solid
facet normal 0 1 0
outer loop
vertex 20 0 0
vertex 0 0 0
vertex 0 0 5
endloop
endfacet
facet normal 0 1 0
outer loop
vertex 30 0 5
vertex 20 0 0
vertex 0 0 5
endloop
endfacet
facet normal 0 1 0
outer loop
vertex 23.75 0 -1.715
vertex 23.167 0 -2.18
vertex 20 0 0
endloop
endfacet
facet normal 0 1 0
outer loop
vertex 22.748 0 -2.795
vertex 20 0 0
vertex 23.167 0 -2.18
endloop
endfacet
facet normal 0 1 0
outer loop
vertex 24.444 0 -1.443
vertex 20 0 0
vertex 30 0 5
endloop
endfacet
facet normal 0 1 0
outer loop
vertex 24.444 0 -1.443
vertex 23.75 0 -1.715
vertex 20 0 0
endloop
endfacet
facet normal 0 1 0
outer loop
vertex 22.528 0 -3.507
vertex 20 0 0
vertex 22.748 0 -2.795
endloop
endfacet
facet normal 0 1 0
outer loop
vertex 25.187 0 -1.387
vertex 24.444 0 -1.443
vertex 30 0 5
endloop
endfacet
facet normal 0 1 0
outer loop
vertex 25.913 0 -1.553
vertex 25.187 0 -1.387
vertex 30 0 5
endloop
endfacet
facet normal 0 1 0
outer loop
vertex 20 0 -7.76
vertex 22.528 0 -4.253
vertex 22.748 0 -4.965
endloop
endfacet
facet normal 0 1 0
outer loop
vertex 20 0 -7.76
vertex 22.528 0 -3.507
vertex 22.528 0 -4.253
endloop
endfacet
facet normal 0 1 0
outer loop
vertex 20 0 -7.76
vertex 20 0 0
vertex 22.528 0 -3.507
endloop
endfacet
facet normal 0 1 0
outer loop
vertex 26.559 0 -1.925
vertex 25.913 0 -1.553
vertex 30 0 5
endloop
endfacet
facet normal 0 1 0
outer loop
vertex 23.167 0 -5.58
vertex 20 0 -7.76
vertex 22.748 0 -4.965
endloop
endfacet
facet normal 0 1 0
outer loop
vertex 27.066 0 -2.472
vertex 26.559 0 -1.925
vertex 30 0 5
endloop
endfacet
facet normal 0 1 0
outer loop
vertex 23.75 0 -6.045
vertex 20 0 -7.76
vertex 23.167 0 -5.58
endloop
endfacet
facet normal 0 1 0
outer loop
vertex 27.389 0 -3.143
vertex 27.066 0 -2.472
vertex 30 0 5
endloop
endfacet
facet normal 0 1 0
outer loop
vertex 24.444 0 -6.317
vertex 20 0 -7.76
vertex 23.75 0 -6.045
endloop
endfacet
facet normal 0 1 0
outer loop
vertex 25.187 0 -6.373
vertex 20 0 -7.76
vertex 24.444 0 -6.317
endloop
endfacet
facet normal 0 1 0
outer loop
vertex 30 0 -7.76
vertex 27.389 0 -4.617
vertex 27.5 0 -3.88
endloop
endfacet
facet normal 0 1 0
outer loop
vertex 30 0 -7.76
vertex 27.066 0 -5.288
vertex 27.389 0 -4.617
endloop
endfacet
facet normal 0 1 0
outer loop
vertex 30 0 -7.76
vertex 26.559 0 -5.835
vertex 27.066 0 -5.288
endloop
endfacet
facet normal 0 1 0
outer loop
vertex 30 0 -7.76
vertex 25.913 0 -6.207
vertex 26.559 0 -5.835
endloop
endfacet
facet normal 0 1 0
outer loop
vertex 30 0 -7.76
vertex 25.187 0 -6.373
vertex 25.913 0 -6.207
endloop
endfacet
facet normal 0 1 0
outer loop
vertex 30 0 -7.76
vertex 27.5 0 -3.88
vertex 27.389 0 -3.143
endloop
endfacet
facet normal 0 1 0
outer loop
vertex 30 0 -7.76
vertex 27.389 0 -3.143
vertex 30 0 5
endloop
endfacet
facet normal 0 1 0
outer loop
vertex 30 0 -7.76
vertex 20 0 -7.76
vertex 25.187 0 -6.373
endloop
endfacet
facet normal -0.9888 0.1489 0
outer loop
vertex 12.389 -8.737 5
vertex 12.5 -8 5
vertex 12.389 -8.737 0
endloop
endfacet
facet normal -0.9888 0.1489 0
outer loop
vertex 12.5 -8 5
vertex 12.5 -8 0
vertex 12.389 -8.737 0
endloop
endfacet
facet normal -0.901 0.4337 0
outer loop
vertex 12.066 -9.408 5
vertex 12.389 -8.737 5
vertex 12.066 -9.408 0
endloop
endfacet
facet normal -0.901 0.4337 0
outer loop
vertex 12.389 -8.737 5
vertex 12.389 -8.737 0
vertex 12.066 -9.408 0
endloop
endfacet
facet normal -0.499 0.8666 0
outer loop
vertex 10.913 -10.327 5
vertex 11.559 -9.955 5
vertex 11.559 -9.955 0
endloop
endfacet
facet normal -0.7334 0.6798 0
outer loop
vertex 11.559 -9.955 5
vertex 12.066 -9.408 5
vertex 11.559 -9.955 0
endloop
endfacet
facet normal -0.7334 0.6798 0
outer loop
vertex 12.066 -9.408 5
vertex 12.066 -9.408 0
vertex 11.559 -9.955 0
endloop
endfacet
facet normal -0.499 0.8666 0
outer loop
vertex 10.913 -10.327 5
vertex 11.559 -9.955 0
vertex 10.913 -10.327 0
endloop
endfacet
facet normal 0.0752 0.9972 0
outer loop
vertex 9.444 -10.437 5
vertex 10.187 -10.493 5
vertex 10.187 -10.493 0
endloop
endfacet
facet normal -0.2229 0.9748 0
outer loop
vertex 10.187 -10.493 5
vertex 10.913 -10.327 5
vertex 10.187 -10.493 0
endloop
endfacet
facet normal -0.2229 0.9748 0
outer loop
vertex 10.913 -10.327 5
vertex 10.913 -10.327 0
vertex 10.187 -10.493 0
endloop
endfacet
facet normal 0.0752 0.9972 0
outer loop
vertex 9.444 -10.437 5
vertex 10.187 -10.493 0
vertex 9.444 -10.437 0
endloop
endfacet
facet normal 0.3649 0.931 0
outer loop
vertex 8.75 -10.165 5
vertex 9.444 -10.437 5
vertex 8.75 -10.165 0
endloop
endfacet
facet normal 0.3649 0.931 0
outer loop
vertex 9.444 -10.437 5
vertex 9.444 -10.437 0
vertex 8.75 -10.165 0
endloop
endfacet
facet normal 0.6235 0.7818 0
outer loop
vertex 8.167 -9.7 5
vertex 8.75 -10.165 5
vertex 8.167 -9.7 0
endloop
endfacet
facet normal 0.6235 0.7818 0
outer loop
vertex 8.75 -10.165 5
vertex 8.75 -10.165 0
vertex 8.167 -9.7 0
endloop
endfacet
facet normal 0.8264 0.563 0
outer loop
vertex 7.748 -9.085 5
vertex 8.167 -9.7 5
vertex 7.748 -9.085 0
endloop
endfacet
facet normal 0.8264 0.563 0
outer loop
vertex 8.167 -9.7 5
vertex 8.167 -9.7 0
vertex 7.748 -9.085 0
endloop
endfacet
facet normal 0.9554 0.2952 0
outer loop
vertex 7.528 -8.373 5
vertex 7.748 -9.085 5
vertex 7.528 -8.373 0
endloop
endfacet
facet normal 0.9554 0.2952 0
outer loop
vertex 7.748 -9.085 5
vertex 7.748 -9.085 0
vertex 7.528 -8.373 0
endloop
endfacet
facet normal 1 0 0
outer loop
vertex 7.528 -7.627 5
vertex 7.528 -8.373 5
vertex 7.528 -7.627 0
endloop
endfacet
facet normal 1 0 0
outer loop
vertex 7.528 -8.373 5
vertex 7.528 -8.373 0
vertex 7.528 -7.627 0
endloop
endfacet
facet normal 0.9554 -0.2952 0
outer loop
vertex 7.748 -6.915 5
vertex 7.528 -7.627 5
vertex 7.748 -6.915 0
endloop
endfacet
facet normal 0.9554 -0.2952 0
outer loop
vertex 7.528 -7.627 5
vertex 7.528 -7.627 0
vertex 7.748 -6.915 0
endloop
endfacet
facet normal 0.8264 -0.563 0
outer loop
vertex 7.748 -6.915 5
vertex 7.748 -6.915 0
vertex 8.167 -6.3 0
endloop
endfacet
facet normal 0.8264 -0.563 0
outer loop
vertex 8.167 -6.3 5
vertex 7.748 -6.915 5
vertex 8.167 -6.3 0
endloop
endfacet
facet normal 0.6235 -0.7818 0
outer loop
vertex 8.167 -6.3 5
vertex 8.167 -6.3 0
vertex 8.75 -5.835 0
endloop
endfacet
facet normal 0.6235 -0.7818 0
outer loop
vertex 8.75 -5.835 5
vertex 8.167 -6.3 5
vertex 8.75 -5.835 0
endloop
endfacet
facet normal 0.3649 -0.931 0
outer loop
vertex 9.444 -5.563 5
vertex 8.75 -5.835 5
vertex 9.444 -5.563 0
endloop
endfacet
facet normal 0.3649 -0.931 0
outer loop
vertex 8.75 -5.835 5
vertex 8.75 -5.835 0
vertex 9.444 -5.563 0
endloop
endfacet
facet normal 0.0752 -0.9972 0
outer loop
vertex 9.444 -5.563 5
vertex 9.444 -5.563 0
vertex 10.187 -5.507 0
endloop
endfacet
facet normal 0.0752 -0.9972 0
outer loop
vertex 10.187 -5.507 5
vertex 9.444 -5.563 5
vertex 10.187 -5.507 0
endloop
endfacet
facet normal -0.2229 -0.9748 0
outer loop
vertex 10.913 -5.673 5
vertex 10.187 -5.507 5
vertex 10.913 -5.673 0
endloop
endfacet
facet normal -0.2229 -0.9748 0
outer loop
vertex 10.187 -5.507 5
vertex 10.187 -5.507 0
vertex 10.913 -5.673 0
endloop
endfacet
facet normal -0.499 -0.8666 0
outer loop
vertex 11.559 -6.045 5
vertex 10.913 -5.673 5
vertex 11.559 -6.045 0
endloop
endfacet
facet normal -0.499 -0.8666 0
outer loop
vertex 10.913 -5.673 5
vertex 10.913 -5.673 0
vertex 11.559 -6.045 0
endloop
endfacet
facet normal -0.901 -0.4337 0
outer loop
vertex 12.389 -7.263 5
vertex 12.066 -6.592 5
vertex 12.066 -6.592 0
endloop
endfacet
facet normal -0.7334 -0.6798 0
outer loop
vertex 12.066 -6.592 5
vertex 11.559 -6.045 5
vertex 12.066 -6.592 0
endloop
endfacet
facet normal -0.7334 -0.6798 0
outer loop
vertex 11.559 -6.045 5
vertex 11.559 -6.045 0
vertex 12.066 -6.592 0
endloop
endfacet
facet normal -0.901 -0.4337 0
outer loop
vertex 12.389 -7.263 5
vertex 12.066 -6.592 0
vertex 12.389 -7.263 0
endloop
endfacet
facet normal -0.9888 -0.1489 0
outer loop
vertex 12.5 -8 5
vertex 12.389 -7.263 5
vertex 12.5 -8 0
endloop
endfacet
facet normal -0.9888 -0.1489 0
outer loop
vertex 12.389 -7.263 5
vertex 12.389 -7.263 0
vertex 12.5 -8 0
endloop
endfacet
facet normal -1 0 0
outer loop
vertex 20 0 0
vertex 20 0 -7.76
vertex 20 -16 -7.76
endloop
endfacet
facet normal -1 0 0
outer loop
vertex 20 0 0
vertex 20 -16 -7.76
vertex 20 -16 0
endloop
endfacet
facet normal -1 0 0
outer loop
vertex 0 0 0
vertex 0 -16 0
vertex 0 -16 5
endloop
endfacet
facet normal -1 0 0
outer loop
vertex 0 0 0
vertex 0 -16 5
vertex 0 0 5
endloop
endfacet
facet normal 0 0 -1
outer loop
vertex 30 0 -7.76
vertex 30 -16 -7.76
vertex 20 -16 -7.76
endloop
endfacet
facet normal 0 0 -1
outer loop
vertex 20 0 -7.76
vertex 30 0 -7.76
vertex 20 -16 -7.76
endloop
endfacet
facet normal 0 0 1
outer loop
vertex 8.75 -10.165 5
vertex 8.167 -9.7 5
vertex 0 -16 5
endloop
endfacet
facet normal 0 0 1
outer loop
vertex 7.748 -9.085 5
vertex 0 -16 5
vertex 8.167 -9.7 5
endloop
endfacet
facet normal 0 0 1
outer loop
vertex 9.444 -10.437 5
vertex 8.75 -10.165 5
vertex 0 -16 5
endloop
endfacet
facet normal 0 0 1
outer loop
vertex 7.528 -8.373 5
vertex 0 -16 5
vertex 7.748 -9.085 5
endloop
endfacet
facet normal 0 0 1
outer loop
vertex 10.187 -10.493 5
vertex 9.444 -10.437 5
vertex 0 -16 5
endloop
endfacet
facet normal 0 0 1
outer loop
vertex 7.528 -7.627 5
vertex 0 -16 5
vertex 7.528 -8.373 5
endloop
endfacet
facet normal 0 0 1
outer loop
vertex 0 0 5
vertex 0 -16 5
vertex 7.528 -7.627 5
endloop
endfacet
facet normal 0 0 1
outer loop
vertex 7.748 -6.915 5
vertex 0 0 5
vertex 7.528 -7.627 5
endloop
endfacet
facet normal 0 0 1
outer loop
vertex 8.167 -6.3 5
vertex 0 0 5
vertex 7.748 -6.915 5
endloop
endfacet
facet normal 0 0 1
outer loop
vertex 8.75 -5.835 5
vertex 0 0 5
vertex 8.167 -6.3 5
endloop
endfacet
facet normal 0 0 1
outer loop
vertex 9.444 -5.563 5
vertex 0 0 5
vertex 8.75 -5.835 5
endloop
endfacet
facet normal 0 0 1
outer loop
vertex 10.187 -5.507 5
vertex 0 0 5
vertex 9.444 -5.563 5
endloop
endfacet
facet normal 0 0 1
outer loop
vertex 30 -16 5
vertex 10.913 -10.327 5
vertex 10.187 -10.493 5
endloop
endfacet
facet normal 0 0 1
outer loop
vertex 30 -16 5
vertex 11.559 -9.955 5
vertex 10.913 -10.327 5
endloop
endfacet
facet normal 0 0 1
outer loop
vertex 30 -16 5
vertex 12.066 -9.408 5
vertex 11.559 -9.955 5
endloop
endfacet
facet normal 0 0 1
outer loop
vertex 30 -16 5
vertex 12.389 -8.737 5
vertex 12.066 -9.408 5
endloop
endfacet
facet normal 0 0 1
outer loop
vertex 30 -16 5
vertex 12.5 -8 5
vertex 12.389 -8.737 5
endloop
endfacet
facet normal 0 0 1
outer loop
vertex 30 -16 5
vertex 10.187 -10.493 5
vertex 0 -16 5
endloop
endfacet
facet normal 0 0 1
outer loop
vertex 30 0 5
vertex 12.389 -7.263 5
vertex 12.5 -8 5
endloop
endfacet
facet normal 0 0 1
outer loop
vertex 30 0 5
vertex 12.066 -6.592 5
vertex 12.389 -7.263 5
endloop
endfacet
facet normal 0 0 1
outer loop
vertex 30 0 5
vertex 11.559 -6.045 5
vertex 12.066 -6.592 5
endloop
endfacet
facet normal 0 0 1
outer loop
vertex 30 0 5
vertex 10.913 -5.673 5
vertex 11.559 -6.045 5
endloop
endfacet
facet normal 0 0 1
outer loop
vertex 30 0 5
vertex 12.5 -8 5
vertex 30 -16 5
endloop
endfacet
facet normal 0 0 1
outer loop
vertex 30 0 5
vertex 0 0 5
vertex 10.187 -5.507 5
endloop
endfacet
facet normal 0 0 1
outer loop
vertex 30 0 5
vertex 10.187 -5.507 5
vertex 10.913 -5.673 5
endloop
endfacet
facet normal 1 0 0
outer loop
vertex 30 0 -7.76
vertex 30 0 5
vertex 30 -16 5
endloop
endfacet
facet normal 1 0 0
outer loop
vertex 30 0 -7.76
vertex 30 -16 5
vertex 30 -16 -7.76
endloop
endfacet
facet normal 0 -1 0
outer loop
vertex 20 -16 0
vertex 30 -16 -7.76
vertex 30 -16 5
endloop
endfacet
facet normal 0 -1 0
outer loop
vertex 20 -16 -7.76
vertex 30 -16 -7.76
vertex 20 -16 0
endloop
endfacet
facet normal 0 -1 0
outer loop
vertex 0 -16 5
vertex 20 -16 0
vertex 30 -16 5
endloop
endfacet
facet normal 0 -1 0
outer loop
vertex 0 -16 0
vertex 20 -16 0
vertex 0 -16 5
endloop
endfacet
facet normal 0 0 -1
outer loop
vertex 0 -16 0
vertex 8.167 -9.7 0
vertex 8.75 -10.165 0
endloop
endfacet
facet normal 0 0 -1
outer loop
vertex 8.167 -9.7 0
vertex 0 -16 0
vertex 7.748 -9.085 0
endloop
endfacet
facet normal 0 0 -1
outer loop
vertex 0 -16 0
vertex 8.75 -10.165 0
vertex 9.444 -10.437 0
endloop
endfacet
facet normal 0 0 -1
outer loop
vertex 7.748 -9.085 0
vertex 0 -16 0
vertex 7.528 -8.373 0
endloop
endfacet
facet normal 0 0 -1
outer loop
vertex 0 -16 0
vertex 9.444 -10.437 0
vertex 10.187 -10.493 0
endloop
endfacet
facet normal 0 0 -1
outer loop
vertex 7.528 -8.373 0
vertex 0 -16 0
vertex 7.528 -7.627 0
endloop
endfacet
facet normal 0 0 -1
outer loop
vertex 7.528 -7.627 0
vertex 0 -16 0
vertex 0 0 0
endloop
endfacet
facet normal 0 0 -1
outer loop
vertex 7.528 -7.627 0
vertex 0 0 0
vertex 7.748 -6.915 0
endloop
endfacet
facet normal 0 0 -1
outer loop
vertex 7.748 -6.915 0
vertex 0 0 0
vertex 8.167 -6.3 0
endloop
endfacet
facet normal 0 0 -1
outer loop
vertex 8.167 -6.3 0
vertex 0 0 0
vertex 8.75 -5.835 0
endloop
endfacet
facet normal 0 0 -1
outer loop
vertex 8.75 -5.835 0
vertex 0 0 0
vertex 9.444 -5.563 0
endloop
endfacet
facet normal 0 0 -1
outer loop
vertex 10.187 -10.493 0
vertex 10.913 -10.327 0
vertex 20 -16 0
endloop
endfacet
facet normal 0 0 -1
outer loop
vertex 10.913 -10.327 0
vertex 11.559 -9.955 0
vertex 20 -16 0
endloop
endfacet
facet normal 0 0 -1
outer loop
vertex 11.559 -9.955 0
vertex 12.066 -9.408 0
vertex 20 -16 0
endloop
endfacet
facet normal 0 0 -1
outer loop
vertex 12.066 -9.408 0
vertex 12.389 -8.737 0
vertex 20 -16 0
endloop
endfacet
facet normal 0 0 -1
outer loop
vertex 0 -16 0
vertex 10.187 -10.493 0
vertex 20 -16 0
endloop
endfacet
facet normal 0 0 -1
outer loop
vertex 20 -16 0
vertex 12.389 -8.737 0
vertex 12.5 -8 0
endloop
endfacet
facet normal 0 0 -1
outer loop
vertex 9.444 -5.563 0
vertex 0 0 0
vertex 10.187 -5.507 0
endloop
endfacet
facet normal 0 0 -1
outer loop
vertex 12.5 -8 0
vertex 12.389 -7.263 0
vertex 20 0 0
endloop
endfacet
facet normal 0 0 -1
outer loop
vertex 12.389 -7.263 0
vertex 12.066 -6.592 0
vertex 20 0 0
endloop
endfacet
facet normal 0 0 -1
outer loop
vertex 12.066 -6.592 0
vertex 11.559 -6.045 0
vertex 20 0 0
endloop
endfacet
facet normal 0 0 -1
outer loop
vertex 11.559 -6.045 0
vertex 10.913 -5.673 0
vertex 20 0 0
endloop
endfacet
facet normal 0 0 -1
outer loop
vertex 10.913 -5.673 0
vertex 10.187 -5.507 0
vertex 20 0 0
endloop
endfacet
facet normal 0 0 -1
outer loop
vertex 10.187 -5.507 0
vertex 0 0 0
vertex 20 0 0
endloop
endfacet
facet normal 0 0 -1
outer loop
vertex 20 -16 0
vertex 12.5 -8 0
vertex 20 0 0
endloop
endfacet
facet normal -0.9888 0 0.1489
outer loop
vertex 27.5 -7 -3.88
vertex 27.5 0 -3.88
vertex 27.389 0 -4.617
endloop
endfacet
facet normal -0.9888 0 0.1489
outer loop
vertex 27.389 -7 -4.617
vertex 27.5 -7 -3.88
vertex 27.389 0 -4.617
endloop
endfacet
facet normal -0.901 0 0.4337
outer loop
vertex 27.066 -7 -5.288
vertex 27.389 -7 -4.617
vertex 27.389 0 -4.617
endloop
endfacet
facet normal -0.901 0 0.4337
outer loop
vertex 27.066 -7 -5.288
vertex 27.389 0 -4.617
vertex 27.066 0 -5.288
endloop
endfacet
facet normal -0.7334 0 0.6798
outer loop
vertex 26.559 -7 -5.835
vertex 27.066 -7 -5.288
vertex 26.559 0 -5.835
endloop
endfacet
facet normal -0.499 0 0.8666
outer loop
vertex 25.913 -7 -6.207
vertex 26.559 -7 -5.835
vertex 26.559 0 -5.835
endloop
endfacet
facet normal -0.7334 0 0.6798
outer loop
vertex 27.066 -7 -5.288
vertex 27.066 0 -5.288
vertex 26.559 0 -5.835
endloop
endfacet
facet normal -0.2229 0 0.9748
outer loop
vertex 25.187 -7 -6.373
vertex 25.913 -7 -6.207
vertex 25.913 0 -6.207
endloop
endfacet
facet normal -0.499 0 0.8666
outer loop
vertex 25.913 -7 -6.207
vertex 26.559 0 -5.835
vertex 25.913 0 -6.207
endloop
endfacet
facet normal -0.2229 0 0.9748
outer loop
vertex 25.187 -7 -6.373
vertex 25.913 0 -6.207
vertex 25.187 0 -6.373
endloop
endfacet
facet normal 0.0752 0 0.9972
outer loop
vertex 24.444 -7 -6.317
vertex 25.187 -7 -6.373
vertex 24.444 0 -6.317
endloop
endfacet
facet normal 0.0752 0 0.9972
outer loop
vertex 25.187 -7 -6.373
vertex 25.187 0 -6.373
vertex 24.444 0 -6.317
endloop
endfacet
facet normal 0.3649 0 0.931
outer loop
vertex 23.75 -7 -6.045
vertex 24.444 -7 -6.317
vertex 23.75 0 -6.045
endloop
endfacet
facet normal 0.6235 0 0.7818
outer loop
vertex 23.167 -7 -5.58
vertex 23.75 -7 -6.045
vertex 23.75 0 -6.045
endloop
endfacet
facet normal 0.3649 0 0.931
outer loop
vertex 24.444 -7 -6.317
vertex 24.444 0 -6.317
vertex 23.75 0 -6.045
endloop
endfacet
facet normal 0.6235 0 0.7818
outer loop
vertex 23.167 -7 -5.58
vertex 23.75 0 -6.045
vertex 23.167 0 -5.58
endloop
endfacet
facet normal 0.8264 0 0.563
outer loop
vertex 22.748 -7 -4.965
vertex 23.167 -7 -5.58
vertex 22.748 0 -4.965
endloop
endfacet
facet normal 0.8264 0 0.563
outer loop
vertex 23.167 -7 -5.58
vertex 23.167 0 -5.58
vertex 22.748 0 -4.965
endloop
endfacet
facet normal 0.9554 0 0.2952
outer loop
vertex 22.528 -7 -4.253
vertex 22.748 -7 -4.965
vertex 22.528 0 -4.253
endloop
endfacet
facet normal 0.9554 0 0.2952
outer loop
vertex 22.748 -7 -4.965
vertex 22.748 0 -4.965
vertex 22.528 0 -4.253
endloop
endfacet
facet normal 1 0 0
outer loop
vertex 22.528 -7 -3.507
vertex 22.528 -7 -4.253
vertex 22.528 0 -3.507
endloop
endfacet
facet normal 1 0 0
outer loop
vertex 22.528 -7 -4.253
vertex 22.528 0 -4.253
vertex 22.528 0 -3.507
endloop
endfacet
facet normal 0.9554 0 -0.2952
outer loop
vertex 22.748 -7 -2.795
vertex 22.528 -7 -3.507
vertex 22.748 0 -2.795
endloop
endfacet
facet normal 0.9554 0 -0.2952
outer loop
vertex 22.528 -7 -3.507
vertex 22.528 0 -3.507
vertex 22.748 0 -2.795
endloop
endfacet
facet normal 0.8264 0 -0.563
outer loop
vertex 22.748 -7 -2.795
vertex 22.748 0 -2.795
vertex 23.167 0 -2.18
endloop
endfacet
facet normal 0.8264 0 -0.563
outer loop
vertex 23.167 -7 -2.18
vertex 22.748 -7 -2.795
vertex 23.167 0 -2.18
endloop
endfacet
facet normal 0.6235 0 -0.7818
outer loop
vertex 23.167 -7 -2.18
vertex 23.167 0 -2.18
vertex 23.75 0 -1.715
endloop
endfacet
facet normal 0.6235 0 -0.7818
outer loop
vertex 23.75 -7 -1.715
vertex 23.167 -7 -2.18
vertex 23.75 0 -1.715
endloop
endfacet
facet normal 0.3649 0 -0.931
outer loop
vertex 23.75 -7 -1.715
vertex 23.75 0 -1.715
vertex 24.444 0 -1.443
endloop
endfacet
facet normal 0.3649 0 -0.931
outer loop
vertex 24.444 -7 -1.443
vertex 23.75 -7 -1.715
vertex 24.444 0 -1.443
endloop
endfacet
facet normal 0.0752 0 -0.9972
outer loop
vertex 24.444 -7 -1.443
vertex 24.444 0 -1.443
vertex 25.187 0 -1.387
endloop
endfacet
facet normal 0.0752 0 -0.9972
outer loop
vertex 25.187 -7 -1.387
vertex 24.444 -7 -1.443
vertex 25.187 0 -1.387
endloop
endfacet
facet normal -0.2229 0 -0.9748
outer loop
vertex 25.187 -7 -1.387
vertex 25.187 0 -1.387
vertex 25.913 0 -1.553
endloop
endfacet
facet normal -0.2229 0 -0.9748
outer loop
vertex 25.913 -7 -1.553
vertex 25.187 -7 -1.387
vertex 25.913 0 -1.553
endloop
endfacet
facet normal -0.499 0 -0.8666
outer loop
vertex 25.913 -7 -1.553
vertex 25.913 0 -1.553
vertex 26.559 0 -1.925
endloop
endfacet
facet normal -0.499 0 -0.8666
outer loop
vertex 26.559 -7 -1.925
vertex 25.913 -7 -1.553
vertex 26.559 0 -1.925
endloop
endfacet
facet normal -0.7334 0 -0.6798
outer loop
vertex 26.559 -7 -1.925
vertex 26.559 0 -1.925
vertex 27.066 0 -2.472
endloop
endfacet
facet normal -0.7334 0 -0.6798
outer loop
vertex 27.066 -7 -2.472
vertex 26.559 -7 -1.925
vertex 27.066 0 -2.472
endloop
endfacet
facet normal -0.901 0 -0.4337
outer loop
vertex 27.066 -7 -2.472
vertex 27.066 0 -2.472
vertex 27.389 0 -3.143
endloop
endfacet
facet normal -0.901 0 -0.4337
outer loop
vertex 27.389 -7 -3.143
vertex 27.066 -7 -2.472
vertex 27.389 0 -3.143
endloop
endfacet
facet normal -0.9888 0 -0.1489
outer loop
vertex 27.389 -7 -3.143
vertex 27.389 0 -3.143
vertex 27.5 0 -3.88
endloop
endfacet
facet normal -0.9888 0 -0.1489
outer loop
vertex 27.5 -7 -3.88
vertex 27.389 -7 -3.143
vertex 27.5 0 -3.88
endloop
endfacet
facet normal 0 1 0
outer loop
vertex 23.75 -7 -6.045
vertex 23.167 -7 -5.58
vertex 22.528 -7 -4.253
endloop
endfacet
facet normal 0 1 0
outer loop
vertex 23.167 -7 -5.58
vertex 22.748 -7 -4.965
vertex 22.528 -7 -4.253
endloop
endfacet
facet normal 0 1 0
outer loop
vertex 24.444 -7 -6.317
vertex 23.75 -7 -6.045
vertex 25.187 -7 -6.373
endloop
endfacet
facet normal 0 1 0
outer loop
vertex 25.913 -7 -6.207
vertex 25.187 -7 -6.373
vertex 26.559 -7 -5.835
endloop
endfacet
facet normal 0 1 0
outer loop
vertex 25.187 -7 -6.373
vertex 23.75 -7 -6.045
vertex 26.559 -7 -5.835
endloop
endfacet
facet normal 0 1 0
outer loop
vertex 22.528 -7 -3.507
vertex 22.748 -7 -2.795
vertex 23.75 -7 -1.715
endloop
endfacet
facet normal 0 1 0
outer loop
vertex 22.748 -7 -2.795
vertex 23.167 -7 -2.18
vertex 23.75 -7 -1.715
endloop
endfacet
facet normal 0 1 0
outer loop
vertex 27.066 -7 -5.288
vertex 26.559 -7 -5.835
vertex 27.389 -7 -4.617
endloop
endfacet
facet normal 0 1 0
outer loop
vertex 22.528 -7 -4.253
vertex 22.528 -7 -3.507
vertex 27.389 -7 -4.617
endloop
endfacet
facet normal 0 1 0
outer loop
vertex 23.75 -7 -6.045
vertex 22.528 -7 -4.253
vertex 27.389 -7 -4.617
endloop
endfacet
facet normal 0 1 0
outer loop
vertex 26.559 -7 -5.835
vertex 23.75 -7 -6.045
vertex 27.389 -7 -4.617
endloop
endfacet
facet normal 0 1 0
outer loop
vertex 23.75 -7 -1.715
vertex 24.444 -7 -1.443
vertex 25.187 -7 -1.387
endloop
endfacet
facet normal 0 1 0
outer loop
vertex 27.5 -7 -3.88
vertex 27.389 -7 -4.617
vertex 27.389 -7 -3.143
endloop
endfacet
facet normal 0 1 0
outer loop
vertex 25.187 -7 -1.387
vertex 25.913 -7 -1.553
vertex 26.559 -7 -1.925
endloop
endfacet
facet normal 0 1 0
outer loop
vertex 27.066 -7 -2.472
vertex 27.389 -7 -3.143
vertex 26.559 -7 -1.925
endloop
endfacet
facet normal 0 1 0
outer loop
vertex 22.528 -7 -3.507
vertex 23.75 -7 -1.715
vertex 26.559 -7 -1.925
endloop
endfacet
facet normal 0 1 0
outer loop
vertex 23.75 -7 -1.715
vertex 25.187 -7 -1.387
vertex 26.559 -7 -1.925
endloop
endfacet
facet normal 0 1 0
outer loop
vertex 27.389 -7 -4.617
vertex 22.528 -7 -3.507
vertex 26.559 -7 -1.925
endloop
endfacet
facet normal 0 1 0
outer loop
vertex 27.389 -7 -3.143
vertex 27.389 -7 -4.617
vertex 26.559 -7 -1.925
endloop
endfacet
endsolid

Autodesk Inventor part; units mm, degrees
ref_plane "YZ Plane" through (0, 0, 0) normal (1, 0, 0) x (0, 1, 0)
ref_plane "XZ Plane" through (0, 0, 0) normal (0, 1, 0) x (-1, 0, 0)
ref_plane "XY Plane" through (0, 0, 0) normal (0, 0, 1) x (1, 0, 0)
sketch "Sketch1" plane through (0, 0, 0) normal (0, 0, 1) x (1, 0, 0)
  line L0 (0, 0) -> (20, 0)
  line L1 (20, 0) -> (20, -16)
  line L2 (20, -16) -> (0, -16)
  line L3 (0, -16) -> (0, 0)
  circle A0 centre (10, -8) radius 2.5
  dimension "d0" = 20
  dimension "d1" = 16
  dimension "d2" = 8
  dimension "d3" = 10
  dimension "d4" = 5
extrude "Extrusion1" add sketch "Sketch1" along normal blind 5
sketch "Sketch2" plane through (0, 0, 0) normal (0, 1, 0) x (1, 0, 0)
  line L0 (20, 0) -> (20, -5) projected
  line L1 (20, 0) -> (30, 0)
  line L2 (30, 0) -> (30, 7.76)
  line L3 (30, 7.76) -> (20, 7.76)
  line L4 (20, 7.76) -> (20, 0)
  line L5 (20, -5) -> (30, -5)
  line L6 (30, -5) -> (30, 0)
  line L7 (30, 0) -> (20, 0)
  line L8 (20, 0) -> (20, -5)
  circle A0 centre (25, 3.88) radius 2.5
  point P0 (0, 0)
  dimension "d7" = 10
  dimension "d8" = 7.76
  dimension "d9" = 5
extrude "Extrusion2" add sketch "Sketch2" against normal blind 16
sketch "Sketch3" plane through (0, -16, 0) normal (0, -1, 0) x (1, 0, 0)
  line L0 (30, -7.76) -> (30, 5) projected
  line L1 (0, 0) -> (20, 0) projected
  line L2 (30, -7.76) -> (20, -7.76)
  line L3 (20, -7.76) -> (20, 0)
  line L4 (20, 0) -> (30, 0)
  line L5 (30, 0) -> (30, -7.76)
extrude "Extrusion3" add sketch "Sketch3" against normal blind 9
equation "\"d2\" = 0.5 * d1"
equation "\"d3\" = 0.5 * d0"
properties part number "cover mount L v01"
